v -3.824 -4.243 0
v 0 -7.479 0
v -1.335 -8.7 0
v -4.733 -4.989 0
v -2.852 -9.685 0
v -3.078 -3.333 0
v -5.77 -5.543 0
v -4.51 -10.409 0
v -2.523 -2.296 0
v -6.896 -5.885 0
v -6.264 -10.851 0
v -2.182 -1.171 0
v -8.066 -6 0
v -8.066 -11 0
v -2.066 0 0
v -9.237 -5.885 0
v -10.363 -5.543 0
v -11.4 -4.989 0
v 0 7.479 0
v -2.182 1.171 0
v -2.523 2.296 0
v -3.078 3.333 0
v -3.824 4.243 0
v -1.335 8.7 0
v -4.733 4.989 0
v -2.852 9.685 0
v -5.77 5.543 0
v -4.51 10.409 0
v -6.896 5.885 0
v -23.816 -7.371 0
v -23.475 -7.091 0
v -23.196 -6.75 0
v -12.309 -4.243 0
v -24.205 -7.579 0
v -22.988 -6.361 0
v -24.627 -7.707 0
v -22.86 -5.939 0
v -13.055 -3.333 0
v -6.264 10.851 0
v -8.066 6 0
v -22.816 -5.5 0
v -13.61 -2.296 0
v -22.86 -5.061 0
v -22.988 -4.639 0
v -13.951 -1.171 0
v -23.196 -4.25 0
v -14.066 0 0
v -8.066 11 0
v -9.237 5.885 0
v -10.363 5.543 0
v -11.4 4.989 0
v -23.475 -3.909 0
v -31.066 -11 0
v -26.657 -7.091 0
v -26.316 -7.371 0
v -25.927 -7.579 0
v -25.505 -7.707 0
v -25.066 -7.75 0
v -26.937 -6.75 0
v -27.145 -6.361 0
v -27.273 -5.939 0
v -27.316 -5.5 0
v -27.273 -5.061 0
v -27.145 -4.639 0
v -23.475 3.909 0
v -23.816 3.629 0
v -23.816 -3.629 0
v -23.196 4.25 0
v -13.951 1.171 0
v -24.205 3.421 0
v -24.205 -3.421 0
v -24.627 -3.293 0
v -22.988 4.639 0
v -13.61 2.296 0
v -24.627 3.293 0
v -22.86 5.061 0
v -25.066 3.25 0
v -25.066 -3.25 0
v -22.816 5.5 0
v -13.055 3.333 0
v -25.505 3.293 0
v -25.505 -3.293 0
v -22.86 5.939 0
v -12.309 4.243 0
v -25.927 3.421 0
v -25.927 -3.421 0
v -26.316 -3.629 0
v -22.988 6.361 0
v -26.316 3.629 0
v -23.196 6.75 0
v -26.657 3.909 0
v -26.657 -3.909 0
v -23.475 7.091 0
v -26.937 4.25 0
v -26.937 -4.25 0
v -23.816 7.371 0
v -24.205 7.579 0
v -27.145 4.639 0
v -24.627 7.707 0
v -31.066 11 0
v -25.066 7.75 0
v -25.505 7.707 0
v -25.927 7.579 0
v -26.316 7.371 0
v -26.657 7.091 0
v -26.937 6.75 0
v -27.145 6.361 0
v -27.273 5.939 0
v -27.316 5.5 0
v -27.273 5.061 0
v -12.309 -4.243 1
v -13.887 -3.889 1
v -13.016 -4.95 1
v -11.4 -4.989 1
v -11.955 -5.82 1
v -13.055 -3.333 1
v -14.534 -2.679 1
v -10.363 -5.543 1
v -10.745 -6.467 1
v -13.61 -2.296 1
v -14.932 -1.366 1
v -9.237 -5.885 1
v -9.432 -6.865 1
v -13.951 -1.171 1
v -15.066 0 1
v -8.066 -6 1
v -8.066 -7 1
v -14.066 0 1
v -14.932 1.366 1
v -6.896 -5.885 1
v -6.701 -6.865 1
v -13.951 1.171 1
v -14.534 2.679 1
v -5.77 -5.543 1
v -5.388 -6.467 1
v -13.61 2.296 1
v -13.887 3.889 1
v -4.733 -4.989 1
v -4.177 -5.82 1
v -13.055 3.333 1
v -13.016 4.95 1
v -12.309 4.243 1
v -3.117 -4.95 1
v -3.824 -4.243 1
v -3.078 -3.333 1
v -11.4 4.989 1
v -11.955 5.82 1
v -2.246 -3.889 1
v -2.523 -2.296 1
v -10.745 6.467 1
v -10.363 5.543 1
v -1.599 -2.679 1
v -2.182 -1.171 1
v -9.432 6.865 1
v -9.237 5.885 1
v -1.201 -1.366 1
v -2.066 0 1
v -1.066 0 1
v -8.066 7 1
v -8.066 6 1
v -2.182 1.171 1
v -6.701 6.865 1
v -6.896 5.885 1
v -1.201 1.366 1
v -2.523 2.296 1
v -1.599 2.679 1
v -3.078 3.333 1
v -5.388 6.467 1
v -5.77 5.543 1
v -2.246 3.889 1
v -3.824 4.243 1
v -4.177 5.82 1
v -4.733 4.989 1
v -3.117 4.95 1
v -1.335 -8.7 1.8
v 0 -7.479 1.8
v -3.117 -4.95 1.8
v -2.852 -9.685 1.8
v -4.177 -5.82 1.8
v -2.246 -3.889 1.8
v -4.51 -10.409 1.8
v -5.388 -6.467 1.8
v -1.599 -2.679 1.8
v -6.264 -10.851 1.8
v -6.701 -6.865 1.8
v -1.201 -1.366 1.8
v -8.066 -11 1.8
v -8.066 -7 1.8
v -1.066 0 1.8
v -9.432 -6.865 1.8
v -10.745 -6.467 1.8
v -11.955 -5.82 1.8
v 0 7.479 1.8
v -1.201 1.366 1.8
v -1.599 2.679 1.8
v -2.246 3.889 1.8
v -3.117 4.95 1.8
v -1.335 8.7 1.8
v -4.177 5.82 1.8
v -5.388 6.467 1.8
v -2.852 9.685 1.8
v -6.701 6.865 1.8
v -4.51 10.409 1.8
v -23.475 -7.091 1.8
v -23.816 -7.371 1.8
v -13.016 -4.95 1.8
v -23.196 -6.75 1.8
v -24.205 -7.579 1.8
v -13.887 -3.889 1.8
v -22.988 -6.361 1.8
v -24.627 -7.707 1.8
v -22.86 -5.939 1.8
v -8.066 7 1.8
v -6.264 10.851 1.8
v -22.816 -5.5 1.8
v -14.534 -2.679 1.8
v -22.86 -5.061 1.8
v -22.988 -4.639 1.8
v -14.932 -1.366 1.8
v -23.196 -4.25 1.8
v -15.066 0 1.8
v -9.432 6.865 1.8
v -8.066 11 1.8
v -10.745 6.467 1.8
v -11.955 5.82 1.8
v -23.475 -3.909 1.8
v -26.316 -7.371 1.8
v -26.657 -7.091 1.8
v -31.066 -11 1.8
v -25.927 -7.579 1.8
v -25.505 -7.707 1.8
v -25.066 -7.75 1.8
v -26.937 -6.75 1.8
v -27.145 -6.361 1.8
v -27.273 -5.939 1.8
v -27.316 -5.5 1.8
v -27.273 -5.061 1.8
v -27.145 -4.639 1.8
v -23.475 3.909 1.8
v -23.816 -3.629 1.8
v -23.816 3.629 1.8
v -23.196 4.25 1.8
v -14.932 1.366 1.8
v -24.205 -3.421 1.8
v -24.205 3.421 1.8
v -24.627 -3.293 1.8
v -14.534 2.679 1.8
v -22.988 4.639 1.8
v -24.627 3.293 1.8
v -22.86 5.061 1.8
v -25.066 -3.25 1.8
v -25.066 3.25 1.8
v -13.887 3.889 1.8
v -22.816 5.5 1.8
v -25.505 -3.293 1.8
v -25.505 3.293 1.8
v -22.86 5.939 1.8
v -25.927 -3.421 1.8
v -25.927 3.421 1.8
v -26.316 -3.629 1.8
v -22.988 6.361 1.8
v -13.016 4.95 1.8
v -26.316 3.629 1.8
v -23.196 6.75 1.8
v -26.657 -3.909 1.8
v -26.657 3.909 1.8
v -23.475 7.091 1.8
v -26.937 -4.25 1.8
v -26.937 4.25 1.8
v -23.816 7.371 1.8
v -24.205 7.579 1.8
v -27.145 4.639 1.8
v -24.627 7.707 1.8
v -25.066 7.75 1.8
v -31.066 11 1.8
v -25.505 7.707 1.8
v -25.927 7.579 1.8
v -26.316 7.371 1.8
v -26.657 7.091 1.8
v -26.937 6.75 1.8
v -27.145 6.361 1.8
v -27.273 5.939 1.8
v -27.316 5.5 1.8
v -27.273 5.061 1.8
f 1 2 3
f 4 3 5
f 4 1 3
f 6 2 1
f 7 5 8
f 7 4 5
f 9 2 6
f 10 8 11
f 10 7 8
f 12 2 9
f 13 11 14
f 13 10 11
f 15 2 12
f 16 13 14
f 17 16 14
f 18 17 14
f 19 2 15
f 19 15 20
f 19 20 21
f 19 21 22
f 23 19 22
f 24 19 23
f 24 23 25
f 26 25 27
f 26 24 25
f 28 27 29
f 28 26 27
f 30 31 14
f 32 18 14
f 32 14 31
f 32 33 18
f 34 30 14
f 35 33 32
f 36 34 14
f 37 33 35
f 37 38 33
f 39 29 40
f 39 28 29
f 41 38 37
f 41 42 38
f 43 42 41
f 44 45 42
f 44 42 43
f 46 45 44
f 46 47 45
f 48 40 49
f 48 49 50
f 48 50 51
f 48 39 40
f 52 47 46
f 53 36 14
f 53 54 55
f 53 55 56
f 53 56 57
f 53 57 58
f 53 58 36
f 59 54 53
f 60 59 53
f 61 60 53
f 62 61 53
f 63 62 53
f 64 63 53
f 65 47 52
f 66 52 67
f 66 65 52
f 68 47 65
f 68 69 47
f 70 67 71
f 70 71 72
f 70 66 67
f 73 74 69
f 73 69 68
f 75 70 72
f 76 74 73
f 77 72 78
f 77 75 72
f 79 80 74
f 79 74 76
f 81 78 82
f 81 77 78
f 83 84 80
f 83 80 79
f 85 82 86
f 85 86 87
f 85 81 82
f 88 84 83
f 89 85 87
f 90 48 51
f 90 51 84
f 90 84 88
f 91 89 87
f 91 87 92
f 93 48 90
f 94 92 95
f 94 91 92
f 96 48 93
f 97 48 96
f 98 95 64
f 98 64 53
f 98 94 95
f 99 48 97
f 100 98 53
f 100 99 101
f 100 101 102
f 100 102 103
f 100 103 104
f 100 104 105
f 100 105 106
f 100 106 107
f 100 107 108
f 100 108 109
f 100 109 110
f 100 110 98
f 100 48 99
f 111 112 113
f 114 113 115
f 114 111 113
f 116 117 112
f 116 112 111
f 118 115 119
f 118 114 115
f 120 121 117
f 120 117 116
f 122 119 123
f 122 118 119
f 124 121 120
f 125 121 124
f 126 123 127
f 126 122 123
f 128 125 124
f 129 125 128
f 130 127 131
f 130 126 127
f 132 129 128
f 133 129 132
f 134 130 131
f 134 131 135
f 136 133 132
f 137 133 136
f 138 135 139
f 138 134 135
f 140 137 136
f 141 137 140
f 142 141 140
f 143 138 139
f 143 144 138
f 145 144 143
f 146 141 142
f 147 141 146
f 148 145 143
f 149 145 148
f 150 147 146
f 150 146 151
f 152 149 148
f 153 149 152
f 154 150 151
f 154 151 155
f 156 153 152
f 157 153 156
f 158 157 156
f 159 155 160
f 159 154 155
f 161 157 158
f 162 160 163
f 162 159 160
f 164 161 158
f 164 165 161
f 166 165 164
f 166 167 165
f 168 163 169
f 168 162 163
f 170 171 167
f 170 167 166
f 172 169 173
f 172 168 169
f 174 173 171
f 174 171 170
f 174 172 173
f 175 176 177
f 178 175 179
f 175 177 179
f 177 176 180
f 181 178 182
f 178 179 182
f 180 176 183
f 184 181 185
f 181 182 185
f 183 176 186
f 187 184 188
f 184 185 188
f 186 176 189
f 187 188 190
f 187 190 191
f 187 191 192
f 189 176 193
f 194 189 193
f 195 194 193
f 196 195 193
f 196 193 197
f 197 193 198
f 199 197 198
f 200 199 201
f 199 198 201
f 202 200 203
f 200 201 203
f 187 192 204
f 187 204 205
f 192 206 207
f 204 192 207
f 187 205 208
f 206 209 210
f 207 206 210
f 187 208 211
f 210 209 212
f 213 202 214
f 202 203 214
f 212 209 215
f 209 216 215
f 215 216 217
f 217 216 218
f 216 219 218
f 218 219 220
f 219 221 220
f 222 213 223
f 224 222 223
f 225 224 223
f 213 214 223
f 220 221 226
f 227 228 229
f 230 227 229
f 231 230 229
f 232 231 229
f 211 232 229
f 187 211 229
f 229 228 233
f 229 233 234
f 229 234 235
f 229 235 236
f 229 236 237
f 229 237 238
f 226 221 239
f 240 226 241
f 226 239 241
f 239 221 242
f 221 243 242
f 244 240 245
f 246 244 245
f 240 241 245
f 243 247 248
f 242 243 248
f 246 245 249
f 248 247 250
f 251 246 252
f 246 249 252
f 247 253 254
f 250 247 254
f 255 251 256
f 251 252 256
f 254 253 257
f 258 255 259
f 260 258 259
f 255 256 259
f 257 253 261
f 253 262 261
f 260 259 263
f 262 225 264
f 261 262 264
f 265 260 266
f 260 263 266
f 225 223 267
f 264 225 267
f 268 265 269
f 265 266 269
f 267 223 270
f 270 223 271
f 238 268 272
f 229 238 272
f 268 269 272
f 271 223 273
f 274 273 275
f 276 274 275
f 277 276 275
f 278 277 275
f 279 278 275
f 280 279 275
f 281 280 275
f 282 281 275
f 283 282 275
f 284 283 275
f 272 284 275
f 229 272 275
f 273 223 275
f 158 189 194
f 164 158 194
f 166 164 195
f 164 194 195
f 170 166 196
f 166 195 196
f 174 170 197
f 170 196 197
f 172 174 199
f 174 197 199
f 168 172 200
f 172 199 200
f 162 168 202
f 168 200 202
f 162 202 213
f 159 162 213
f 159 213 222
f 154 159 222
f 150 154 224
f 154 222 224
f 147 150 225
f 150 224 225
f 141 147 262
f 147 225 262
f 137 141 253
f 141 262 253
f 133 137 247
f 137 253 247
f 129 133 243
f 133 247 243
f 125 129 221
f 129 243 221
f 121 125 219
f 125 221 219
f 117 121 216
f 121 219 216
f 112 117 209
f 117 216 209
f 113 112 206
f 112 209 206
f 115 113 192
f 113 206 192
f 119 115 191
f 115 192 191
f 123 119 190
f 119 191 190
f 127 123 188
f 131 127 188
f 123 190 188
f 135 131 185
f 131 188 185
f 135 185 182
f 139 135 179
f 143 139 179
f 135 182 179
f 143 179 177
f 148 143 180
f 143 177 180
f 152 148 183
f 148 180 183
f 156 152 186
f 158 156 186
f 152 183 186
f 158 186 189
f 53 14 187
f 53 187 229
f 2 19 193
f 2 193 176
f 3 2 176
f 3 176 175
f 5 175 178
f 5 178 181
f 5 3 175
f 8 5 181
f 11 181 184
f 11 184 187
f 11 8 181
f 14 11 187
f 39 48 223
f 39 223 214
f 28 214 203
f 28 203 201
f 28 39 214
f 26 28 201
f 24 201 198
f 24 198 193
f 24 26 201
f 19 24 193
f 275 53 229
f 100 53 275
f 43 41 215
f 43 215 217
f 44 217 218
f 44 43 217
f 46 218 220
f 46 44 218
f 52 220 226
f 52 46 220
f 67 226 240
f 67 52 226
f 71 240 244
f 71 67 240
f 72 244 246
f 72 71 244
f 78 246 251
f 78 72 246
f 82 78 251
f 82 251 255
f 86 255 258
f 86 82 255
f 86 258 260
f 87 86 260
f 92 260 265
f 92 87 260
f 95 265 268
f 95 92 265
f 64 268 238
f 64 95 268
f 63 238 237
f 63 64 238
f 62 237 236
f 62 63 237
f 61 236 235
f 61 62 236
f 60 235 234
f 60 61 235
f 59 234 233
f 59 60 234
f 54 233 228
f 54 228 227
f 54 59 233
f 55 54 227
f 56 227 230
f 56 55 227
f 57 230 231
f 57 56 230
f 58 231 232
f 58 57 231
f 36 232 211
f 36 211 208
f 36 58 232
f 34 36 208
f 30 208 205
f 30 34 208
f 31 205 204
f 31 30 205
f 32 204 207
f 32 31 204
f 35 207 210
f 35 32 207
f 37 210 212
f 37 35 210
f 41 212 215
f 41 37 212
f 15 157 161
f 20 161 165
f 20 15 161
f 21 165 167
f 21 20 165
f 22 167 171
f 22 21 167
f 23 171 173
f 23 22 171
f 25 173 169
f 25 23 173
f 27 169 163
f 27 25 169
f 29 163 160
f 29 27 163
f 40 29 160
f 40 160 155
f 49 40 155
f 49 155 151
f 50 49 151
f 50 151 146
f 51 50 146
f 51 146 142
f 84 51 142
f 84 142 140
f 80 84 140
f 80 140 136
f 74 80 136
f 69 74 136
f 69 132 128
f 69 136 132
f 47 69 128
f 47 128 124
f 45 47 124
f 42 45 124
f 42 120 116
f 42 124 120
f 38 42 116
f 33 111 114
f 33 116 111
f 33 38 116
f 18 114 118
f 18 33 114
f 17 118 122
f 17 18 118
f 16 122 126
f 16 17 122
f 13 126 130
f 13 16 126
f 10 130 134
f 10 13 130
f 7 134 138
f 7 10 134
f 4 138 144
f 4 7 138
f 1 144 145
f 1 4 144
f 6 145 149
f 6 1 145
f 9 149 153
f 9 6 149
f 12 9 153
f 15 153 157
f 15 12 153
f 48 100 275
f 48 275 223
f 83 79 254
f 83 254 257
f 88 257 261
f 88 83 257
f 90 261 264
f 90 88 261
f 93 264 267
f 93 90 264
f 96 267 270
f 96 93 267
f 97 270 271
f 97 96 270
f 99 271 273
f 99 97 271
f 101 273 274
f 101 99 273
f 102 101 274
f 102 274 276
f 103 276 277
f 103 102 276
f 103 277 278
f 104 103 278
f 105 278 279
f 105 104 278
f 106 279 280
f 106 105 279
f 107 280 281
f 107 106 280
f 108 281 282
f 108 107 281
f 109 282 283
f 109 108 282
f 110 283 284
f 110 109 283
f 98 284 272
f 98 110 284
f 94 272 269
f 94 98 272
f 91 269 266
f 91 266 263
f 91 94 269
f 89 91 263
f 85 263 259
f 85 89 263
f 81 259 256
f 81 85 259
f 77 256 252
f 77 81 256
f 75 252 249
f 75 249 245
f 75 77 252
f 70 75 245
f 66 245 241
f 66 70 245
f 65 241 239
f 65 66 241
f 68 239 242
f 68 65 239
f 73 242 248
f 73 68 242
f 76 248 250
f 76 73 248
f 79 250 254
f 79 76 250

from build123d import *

# Parameters (mm, degrees)
SKETCH_1_R          = 2.25
SKETCH_1_R_2        = 6
EXTRUDE_1_DEPTH     = 1.8
SKETCH_2_R          = 7
CUT_EXTRUDE_1_DEPTH = 0.8


with BuildPart() as part:
    # 草图1 → 凸台-拉伸1 (new body)
    with BuildSketch(Plane.XY):
        with BuildLine():
            Line((0, 7.478796414), (0, -7.478796414))
            ThreePointArc((0, -7.478796414), (-3.665697116, -10.081338219), (-8.066449293, -11))
            Line((-8.066449293, -11), (-31.066449293, -11))
            Line((-31.066449293, -11), (-31.066449293, 11))
            Line((-31.066449293, 11), (-8.066449293, 11))
            ThreePointArc((-8.066449293, 11), (-3.665697116, 10.081338219), (0, 7.478796414))
        make_face()
        with Locations((-25.066449293, 5.5)):
            Circle(SKETCH_1_R, mode=Mode.SUBTRACT)
        with Locations((-25.066449293, -5.5)):
            Circle(SKETCH_1_R, mode=Mode.SUBTRACT)
        with Locations((-8.066449293, 0)):
            Circle(SKETCH_1_R_2, mode=Mode.SUBTRACT)
    extrude(amount=EXTRUDE_1_DEPTH)

    # 草图2 → 切除-拉伸1 (cut)
    with BuildSketch(Plane.XY.offset(1.8)):
        with Locations((-8.066449293, 0)):
            Circle(SKETCH_2_R)
    extrude(amount=-CUT_EXTRUDE_1_DEPTH, mode=Mode.SUBTRACT)


solid = part.part
